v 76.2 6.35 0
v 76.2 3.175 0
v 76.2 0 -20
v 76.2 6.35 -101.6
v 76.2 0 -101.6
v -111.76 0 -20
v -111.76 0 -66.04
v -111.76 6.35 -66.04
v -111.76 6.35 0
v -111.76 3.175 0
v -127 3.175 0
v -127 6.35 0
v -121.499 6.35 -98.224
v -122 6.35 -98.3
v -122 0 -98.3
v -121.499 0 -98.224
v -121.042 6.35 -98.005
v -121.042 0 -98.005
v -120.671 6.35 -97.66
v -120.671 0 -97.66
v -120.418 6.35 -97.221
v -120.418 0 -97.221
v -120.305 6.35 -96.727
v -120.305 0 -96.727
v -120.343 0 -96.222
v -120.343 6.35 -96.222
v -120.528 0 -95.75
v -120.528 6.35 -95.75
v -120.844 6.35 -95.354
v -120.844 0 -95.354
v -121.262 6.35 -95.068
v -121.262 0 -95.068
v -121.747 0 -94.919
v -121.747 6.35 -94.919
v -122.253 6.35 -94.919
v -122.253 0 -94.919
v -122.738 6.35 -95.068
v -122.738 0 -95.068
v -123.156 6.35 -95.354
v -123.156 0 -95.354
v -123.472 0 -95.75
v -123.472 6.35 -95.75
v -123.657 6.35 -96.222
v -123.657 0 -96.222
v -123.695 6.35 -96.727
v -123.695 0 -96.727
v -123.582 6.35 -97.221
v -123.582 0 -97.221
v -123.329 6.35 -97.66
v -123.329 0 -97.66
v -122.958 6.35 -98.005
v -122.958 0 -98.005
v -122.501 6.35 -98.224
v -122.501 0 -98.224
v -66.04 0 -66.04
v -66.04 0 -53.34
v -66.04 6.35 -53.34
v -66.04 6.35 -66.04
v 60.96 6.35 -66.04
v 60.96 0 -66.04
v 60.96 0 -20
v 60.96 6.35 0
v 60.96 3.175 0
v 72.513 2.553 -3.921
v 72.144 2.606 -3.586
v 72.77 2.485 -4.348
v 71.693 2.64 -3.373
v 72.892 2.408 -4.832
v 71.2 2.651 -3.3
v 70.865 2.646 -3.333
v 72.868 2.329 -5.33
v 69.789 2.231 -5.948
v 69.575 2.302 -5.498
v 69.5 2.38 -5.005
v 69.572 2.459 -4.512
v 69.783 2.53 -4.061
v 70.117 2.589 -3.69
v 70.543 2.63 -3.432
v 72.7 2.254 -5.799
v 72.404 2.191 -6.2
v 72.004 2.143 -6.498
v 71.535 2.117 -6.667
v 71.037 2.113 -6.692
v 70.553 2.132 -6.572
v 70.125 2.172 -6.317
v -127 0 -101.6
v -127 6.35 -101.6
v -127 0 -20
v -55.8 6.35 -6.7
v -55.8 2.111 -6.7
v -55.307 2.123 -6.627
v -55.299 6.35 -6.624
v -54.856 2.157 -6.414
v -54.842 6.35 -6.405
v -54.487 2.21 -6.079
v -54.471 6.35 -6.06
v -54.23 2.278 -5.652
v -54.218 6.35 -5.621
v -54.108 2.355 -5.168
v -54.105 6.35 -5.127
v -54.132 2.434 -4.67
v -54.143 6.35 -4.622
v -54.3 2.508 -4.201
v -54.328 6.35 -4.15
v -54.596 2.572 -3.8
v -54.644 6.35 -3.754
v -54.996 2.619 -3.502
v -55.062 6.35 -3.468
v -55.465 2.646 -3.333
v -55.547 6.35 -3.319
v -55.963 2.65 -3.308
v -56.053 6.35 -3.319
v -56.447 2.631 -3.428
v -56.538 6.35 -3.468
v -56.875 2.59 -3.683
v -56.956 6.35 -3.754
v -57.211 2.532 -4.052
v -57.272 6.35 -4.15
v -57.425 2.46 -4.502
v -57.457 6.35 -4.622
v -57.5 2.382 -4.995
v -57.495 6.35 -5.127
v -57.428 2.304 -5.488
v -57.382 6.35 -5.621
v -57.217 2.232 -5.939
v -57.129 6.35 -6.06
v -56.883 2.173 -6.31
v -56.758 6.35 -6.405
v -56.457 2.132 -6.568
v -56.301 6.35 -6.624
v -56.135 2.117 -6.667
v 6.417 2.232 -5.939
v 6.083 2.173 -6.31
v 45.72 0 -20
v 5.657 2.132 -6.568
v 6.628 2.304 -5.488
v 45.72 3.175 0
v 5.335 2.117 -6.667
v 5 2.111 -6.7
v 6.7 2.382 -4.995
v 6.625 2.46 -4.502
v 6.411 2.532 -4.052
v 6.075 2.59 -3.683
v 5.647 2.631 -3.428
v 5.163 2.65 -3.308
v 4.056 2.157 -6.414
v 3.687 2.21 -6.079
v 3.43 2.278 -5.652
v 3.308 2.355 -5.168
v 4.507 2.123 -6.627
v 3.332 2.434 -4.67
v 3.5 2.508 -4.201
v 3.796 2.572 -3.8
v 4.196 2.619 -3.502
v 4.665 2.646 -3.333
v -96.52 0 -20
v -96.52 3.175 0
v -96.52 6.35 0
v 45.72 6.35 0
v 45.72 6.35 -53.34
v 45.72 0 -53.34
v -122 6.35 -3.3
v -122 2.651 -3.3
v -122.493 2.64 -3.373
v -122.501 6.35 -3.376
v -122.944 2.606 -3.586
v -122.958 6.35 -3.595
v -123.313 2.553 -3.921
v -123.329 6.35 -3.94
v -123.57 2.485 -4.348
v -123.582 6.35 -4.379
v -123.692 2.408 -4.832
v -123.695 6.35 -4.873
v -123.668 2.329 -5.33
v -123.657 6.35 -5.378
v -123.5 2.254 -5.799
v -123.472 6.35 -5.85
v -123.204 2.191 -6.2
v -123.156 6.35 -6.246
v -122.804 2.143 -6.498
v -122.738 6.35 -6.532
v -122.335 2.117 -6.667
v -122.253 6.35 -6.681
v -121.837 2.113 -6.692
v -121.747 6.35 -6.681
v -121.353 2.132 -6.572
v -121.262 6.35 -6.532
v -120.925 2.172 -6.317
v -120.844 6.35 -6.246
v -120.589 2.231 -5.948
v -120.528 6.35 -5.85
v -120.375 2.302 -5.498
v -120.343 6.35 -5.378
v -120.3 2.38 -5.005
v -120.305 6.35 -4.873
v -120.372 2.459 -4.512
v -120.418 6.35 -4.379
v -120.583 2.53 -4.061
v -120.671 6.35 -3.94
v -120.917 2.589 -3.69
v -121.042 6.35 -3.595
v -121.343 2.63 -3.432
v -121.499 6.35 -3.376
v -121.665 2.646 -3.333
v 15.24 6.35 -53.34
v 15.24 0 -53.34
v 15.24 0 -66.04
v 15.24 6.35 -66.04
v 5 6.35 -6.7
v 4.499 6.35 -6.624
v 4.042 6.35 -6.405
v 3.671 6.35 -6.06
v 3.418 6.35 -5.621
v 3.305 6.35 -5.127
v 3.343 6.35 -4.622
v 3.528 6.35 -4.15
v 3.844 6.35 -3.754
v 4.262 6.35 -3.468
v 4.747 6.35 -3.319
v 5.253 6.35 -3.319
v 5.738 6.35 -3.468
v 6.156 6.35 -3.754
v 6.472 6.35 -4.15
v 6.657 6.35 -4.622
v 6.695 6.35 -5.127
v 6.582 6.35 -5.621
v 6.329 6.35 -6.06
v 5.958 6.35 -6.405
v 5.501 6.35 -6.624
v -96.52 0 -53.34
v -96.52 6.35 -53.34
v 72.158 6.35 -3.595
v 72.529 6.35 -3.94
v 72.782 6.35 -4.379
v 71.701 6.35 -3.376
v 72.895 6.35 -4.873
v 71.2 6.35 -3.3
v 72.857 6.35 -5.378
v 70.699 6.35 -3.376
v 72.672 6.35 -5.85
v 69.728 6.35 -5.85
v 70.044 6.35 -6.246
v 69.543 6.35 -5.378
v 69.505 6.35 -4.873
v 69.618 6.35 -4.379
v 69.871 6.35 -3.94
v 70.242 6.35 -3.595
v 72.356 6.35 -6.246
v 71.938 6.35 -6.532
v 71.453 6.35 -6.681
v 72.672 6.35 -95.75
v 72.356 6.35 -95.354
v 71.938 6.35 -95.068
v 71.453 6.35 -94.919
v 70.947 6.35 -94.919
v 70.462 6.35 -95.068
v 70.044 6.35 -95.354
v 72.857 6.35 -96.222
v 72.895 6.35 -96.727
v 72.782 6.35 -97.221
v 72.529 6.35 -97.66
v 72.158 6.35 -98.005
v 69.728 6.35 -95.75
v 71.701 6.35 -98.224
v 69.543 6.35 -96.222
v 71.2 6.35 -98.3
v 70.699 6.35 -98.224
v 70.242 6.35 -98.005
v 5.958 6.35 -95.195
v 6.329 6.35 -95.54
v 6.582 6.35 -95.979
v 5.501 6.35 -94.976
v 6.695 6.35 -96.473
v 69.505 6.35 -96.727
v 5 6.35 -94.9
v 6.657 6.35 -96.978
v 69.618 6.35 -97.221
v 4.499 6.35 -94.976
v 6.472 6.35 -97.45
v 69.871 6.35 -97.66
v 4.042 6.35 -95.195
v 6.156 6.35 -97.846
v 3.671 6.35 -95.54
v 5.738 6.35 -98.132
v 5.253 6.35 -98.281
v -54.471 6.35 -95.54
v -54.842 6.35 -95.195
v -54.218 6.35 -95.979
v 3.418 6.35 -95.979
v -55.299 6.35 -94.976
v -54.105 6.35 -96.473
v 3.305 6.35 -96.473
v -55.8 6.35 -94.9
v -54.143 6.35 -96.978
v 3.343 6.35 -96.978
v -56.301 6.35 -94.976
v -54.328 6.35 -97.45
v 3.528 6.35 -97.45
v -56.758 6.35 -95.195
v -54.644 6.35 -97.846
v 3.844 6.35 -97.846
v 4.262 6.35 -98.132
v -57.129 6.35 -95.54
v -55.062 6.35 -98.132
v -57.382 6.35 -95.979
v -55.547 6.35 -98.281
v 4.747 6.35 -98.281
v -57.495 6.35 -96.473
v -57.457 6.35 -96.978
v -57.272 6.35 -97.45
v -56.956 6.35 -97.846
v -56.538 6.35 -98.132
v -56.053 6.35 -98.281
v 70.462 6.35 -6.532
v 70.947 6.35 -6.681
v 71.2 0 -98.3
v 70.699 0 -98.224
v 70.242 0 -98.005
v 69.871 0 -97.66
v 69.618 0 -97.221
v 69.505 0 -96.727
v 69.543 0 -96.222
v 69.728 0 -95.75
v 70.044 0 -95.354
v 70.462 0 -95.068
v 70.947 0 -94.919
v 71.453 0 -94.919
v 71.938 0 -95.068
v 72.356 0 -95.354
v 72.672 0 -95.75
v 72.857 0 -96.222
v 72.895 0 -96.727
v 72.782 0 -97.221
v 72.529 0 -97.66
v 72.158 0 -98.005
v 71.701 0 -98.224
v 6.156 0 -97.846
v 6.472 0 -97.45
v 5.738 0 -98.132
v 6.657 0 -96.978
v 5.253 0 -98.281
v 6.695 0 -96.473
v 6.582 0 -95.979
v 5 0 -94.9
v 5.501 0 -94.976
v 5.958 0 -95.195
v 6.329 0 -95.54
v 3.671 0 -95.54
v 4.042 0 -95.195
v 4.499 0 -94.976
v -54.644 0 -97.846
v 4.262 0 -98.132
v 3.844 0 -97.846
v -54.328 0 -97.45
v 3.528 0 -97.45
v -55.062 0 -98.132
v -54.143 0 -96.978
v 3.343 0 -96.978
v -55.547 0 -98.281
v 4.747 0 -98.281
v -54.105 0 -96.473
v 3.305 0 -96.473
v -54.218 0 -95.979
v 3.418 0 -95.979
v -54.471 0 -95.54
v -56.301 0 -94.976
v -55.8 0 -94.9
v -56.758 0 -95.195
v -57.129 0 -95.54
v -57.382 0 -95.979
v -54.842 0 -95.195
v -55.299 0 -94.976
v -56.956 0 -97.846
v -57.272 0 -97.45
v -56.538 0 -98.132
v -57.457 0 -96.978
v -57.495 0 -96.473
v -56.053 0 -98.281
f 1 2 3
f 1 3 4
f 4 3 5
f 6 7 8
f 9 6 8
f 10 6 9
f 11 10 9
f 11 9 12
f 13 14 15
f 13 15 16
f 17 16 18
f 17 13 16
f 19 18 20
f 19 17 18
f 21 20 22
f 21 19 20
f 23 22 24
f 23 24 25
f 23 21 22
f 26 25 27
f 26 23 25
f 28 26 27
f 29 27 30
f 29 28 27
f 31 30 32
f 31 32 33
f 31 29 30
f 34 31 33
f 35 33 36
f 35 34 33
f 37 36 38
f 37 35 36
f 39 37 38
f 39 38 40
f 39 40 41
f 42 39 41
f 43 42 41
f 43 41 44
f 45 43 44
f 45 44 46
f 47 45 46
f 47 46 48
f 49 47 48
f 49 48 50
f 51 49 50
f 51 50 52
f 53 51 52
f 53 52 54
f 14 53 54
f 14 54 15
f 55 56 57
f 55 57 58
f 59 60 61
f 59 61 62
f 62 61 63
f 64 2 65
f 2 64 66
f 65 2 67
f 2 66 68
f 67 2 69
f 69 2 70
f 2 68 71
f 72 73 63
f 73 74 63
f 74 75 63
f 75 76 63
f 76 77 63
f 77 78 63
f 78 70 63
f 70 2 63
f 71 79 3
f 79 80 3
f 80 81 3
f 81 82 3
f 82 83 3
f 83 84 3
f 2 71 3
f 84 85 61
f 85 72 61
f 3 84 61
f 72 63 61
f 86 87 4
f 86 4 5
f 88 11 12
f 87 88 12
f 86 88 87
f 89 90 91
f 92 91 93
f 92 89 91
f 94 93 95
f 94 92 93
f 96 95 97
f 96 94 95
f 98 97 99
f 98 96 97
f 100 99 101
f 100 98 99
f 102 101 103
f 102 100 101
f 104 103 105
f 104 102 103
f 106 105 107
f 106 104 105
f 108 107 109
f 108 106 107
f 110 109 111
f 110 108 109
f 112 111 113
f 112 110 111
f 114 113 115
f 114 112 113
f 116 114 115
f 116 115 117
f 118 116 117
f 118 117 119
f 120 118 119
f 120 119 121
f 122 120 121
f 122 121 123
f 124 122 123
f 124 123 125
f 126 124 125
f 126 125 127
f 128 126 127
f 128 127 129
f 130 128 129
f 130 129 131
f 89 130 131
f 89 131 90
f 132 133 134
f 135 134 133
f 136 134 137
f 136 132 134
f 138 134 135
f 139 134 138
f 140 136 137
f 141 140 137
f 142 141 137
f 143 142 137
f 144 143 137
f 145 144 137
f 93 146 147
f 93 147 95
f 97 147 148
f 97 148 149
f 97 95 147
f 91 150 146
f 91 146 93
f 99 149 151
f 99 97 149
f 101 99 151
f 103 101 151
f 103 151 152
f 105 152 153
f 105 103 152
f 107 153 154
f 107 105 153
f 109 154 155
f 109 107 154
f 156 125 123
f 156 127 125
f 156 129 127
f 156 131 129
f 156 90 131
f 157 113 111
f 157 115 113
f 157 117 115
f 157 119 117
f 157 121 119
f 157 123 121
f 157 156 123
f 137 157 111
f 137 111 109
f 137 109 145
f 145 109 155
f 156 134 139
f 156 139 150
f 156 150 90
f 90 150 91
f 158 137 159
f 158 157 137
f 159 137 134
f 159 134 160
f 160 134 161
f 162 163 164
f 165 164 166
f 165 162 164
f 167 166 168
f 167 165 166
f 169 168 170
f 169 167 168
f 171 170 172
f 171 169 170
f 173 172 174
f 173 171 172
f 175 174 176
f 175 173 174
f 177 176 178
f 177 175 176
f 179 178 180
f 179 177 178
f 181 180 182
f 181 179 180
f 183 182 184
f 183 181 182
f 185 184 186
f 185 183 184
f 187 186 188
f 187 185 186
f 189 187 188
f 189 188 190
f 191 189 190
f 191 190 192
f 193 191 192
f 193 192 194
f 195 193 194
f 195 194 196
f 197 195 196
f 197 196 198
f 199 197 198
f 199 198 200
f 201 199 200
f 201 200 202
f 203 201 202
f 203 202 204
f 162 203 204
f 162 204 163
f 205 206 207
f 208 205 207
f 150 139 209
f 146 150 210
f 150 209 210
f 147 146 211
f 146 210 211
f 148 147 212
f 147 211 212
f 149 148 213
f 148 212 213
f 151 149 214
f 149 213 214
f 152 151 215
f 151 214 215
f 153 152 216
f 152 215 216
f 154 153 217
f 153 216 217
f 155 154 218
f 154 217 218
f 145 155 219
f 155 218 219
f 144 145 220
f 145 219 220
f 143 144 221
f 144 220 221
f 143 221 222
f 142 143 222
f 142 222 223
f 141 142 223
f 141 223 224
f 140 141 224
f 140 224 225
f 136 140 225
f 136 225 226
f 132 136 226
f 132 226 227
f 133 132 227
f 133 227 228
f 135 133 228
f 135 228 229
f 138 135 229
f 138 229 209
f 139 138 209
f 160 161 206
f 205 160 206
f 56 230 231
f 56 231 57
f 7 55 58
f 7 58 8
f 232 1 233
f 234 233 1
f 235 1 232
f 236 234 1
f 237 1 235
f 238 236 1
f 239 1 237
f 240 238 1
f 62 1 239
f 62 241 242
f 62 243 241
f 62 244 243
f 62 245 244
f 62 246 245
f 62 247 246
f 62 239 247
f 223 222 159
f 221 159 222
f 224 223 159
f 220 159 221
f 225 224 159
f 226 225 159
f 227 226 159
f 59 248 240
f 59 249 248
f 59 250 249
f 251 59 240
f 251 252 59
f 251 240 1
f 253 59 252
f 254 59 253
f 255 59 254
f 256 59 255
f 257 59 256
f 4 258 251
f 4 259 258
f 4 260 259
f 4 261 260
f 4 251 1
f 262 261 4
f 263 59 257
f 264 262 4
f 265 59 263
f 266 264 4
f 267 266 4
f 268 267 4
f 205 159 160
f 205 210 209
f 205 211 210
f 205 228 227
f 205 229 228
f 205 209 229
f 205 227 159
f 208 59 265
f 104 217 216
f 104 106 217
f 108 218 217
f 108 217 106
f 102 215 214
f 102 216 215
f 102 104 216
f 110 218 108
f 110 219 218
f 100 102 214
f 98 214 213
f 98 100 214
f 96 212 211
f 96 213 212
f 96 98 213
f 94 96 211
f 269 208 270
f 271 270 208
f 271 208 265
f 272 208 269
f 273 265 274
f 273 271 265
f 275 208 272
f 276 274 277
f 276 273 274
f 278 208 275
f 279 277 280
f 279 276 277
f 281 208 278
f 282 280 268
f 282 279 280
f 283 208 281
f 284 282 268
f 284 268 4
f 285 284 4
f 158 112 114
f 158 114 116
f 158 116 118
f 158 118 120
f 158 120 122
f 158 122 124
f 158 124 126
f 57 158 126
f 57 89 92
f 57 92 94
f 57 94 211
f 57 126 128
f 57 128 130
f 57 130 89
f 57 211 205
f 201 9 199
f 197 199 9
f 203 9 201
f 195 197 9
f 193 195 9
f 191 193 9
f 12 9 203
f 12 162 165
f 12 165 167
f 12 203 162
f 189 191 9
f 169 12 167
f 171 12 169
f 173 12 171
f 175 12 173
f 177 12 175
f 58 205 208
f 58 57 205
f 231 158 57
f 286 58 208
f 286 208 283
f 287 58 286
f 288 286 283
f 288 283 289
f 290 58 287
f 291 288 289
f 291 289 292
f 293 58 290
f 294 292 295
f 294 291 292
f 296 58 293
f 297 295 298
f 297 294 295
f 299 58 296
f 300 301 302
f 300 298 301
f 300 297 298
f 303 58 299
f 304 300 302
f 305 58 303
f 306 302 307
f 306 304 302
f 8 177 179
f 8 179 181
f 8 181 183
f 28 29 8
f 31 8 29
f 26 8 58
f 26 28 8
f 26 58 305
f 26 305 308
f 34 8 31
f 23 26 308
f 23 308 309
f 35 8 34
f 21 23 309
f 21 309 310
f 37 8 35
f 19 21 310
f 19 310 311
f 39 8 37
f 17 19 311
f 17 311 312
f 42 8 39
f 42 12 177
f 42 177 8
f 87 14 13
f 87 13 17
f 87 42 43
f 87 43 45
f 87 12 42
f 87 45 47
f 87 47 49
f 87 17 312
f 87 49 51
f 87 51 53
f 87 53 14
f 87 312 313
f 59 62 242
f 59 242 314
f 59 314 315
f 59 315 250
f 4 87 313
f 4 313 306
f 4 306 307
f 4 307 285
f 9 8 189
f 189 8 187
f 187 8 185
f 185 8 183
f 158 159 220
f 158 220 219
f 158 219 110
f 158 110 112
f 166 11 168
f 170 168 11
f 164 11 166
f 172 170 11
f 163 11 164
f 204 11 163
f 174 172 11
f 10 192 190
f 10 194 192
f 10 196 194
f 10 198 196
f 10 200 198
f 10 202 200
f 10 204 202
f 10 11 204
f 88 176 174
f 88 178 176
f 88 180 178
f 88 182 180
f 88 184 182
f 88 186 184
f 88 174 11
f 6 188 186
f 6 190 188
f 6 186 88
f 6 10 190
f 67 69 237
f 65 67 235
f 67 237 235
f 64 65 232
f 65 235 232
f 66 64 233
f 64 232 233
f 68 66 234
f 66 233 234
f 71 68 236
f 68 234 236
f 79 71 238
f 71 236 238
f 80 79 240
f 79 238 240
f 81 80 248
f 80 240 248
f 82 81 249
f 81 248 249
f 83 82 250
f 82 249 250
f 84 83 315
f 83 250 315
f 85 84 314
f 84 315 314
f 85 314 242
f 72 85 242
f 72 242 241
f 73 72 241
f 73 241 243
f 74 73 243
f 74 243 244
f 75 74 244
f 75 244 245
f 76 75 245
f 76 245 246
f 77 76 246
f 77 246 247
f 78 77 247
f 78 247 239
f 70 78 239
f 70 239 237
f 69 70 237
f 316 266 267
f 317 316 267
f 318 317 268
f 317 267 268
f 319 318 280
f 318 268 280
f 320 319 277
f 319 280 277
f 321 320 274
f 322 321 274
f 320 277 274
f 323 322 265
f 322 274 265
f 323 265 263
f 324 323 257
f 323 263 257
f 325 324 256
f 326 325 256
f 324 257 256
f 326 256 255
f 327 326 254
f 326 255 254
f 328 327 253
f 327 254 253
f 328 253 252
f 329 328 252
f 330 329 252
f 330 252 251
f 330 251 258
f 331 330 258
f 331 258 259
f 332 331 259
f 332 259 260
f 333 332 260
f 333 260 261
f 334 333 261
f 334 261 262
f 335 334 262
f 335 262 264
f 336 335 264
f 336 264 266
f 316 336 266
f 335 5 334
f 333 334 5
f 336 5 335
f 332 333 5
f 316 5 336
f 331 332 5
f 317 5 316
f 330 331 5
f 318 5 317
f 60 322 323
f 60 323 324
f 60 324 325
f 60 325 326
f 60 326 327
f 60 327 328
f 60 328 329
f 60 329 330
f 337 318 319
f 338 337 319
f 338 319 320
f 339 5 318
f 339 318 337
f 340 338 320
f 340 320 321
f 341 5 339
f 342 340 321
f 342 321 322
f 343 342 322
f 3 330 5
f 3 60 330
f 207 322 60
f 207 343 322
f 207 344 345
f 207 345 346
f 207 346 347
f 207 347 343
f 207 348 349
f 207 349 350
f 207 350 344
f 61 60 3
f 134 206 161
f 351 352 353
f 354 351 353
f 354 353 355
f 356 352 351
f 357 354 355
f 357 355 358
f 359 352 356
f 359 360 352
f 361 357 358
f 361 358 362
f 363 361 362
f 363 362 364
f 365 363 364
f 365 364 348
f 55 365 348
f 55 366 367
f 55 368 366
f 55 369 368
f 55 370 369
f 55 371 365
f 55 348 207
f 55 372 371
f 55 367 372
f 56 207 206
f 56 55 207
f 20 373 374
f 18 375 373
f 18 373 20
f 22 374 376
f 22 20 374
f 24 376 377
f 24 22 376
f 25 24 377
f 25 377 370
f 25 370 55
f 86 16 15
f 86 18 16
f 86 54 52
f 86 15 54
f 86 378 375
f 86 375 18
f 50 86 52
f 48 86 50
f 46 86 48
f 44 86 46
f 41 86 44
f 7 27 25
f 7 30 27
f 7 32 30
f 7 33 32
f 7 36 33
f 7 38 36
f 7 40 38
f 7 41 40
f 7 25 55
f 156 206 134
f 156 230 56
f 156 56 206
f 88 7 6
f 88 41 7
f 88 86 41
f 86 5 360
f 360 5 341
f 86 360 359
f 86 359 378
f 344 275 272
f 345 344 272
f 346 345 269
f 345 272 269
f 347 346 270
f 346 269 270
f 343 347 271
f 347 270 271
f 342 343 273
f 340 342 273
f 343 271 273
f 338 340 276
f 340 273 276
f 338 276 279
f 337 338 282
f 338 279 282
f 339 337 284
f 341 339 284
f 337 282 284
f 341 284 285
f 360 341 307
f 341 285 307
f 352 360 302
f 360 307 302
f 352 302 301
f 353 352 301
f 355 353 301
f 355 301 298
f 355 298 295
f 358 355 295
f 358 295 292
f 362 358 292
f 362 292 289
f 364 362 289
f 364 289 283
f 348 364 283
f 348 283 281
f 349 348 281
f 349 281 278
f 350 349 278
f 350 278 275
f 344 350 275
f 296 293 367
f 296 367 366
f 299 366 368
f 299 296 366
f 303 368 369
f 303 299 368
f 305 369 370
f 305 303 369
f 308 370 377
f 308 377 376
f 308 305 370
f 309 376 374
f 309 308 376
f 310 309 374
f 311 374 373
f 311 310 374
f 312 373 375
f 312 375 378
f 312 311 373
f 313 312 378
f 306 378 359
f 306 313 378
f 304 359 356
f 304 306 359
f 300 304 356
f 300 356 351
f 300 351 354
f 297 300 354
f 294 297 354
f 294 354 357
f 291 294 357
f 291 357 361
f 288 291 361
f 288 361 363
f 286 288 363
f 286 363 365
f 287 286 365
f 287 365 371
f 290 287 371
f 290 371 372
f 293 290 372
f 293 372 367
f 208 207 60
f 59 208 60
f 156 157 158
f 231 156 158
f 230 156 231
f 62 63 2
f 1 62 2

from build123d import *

# Parameters (mm, degrees)
BOSS_EXTRUDE1_DEPTH = 6.35
SKETCH2_R           = 1.7
CUT_EXTRUDE1_DEPTH  = 128.158650905
CUT_EXTRUDE2_DEPTH  = 128.158650905
BOSS_EXTRUDE2_DEPTH = 50.8


with BuildPart() as part:
    # Sketch1 → Boss-Extrude1 (new body)
    with BuildSketch(Plane(origin=(0, 0, 0), x_dir=(1, 0, 0), z_dir=(0, 1, 0))):
        Polygon((15.24, 53.34), (15.24, 66.04), (60.96, 66.04), (60.96, 0), (76.2, 0), (76.2, 101.6), (0, 101.6), (0, 0), (10, 0), (45.72, 0), (45.72, 53.34), align=None)
    extrude(amount=BOSS_EXTRUDE1_DEPTH)

    # Sketch2 → Cut-Extrude1 (cut, through all)
    with BuildSketch(Plane(origin=(0, 6.35, 0), x_dir=(1, 0, 0), z_dir=(0, 1, 0))):
        with Locations(Location((5, 96.6, 0), (0, 0, 270))):
            Circle(SKETCH2_R)
        with Locations(Location((71.2, 96.6, 0), (0, 0, 90))):
            Circle(SKETCH2_R)
        with Locations(Location((71.2, 5, 0), (0, 0, 270))):
            Circle(SKETCH2_R)
        with Locations(Location((5, 5, 0), (0, 0, 90))):
            Circle(SKETCH2_R)
    extrude(amount=-CUT_EXTRUDE1_DEPTH, mode=Mode.SUBTRACT)

    # Sketch3 → Cut-Extrude2 (cut, through all)
    with BuildSketch(Plane.ZY):
        Polygon((0, 3.175), (-20, 0), (0, 0), align=None)
    extrude(amount=-CUT_EXTRUDE2_DEPTH, mode=Mode.SUBTRACT)


with BuildPart() as body_2:
    # Mirror1: mirrored copy
    add(part.part.mirror(Plane.ZY.offset(25.4)))


with BuildPart() as part_1:
    add(part.part)

    add(body_2.part)  # Boss-Extrude2 merges body 2
    # Sketch4 → Boss-Extrude2 (add)
    with BuildSketch(Plane(origin=(-50.8, 0, 0), x_dir=(0, 0, -1), z_dir=(1, 0, 0))):
        Polygon((0, 6.35), (101.6, 6.35), (101.6, 0), (20, 0), (0, 3.175), align=None)
    extrude(amount=BOSS_EXTRUDE2_DEPTH)


solid = part_1.part
